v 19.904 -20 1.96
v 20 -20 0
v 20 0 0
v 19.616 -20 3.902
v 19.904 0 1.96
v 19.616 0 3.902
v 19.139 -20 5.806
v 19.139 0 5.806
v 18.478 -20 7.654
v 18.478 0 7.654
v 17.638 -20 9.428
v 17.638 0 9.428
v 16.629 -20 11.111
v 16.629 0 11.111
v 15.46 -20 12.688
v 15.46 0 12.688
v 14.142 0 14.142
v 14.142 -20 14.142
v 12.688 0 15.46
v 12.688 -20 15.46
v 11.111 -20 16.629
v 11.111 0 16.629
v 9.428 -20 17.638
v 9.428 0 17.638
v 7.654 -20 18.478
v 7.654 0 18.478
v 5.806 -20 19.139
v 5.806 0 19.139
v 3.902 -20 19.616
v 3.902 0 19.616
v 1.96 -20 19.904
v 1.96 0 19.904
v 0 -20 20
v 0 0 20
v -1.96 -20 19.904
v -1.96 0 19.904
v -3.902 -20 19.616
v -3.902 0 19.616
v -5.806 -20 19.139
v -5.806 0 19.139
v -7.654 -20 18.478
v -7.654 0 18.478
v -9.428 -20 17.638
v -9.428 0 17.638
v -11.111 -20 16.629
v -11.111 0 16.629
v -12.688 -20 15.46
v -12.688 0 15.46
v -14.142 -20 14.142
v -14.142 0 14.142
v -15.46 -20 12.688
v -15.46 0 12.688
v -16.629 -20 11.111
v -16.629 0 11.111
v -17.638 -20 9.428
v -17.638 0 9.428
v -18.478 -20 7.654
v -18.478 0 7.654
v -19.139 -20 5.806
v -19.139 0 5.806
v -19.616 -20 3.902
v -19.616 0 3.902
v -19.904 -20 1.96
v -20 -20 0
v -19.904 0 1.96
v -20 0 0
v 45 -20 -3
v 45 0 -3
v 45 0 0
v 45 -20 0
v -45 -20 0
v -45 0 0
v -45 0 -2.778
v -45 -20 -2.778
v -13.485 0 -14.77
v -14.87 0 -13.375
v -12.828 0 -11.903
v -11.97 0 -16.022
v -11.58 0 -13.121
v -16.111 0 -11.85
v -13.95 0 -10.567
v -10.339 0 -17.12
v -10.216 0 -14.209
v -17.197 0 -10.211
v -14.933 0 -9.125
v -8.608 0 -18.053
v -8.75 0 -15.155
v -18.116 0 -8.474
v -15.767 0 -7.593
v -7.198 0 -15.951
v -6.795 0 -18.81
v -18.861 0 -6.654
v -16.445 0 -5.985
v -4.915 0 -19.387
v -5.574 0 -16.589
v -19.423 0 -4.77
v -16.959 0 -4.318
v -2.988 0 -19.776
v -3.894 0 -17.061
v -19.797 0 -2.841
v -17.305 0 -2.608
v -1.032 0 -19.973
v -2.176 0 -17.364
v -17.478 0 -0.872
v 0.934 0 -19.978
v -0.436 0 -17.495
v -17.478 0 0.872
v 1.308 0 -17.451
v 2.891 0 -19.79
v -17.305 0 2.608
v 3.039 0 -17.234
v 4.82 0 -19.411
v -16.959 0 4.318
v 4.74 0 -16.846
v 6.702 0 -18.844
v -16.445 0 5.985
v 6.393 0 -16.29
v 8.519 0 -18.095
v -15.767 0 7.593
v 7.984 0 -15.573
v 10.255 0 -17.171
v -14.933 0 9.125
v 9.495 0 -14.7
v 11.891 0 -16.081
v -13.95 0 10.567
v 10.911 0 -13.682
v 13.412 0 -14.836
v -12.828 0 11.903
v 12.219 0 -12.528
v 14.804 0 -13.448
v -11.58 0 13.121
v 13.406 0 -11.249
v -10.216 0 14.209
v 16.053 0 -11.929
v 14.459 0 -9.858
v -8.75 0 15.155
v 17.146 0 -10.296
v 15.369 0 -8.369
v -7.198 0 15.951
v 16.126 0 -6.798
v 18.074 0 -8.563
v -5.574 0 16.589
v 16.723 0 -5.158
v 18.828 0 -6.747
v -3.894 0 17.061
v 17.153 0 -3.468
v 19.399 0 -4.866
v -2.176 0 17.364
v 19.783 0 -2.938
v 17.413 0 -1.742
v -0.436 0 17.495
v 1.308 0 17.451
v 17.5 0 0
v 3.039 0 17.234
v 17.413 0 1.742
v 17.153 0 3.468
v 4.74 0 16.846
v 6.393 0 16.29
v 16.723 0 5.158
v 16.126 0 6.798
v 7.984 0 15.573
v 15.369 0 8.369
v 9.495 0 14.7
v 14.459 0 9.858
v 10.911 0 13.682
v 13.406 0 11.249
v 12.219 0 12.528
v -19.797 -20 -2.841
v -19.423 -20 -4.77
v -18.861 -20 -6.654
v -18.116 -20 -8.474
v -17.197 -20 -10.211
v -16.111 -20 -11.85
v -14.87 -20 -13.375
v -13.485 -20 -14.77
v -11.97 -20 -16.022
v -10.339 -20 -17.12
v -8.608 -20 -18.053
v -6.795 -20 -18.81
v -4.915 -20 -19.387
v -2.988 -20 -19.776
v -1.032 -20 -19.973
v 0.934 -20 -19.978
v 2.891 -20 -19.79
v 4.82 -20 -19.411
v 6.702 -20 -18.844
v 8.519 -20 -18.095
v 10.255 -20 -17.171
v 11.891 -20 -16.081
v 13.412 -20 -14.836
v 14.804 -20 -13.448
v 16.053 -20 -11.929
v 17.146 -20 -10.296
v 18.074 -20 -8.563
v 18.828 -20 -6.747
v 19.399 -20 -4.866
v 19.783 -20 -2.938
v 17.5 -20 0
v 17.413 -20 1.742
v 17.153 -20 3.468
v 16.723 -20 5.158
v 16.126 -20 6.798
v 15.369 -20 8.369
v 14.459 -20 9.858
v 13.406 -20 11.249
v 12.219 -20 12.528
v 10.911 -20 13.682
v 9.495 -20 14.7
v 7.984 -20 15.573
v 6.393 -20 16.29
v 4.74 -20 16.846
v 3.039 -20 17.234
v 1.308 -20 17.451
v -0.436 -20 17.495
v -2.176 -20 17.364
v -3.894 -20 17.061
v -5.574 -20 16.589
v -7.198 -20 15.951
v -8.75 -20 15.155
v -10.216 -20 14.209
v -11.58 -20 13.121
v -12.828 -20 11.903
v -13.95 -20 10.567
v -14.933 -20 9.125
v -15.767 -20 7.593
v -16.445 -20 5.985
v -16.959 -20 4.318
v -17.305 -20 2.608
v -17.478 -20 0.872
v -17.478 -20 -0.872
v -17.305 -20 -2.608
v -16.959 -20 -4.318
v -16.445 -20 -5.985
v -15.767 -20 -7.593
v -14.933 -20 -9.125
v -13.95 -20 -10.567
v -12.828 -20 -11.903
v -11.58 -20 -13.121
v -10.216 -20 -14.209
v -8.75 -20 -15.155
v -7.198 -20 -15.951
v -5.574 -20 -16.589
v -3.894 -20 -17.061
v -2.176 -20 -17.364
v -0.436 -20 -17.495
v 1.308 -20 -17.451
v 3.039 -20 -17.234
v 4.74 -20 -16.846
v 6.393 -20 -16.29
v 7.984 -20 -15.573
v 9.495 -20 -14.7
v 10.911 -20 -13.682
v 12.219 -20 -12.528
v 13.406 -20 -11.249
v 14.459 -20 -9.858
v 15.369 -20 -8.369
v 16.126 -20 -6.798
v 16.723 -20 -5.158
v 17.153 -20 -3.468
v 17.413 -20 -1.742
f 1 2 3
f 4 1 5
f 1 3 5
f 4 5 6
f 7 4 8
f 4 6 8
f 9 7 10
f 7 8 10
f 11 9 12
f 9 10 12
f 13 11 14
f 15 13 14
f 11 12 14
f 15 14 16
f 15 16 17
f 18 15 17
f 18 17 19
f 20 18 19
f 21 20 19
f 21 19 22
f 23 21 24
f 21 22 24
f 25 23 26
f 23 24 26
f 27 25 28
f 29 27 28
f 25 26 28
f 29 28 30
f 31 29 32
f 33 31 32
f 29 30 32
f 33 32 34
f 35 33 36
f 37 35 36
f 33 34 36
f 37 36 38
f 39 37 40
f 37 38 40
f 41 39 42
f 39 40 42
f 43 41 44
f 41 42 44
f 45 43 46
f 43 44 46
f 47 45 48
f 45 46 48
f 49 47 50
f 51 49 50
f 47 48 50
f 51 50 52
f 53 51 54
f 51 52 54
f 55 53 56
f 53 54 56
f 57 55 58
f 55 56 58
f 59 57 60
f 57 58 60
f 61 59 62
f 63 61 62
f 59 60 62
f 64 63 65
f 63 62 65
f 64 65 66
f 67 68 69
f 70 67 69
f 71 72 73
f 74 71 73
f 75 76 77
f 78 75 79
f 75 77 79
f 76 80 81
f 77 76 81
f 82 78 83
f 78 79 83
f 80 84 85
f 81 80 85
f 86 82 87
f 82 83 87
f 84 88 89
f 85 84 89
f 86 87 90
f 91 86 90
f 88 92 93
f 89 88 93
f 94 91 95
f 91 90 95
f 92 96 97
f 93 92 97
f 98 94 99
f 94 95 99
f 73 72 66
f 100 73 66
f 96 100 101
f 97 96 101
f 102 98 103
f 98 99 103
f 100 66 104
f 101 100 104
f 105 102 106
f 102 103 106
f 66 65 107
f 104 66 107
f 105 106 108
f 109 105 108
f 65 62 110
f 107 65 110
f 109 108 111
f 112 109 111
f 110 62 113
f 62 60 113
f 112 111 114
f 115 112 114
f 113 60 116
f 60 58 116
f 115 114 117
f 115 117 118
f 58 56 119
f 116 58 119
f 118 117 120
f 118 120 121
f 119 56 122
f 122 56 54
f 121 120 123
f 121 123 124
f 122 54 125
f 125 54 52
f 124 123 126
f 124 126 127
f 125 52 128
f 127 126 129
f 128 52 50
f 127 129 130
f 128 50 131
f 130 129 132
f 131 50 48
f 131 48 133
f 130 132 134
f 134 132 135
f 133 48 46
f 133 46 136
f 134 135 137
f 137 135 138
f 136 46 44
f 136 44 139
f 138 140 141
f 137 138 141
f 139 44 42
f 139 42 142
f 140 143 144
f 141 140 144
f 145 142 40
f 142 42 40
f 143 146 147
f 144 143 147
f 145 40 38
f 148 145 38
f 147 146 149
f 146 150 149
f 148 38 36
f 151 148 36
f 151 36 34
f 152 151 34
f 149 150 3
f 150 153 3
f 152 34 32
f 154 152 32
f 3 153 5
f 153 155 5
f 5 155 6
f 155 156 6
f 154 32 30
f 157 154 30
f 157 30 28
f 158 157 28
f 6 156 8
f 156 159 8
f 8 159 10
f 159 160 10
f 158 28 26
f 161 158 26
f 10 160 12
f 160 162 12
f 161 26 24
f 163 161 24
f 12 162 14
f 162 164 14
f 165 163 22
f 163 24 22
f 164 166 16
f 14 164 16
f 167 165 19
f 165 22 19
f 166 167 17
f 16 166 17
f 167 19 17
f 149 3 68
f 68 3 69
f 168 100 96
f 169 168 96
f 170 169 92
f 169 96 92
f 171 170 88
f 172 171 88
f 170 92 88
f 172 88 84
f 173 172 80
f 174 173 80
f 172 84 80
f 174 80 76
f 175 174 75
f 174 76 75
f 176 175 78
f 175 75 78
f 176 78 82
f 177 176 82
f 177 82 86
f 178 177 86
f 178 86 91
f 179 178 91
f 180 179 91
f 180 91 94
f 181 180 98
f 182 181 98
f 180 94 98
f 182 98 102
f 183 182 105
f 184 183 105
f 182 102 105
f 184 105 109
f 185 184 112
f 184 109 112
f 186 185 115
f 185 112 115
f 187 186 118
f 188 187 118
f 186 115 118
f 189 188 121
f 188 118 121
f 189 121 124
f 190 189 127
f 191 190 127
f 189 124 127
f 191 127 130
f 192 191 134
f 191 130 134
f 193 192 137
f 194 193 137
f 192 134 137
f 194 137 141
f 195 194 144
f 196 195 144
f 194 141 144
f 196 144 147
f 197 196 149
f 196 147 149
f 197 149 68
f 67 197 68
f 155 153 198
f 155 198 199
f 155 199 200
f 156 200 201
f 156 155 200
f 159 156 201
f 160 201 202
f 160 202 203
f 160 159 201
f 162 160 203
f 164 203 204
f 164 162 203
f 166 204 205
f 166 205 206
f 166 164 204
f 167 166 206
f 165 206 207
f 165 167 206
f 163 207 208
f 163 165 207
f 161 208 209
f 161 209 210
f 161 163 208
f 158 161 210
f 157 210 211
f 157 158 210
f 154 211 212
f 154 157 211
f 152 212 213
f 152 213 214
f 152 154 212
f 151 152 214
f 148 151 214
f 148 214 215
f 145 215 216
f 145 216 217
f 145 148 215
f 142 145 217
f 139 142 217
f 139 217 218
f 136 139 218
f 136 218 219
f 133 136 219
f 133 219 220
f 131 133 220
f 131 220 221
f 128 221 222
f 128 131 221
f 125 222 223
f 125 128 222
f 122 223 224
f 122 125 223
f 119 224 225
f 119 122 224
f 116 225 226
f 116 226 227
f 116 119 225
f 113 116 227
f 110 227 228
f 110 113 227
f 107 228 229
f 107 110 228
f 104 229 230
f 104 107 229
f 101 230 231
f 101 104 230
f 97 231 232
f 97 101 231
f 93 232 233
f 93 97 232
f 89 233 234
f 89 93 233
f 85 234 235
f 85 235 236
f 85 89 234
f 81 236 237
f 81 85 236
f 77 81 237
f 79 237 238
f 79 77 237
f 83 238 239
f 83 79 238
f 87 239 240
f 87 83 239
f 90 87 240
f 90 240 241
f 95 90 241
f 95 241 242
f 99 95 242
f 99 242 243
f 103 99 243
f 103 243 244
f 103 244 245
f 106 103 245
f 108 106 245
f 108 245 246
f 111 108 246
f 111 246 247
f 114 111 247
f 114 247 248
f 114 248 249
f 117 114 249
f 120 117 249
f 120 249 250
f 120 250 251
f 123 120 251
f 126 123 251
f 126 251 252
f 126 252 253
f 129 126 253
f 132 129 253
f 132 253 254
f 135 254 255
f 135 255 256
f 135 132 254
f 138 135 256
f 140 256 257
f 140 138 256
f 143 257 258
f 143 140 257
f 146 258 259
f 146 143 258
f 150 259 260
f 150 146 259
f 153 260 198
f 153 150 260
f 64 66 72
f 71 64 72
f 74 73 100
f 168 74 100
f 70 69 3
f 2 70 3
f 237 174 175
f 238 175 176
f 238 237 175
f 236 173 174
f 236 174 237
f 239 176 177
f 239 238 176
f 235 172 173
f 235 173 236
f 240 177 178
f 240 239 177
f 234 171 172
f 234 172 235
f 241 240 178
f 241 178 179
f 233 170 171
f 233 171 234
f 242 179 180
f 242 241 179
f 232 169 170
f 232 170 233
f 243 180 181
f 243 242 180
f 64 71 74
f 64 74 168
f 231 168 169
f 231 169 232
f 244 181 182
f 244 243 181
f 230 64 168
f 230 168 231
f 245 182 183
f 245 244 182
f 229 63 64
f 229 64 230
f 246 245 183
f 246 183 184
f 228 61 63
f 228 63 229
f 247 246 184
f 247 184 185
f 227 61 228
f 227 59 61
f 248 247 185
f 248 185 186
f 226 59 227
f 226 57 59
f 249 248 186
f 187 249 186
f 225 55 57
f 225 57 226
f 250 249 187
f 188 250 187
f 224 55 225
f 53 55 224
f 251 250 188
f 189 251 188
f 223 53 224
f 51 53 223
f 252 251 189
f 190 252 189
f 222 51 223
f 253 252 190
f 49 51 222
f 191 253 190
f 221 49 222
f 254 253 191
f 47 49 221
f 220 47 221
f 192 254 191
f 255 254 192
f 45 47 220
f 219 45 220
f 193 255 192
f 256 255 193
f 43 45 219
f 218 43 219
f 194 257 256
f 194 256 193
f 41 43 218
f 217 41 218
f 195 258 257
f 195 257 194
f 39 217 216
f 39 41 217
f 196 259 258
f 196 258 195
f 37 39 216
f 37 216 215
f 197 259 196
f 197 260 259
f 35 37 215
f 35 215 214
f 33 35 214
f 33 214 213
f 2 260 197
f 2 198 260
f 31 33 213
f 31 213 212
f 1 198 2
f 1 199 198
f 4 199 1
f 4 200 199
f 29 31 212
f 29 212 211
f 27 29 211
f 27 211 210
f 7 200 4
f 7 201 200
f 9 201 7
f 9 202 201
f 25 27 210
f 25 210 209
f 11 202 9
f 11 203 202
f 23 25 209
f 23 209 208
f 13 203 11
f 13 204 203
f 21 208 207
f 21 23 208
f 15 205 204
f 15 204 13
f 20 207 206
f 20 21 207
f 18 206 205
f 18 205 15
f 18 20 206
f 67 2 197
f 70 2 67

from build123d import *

# Parameters (mm, degrees)
F0_R     = 17.5
F1_DEPTH = 20


with BuildPart() as f1:
    # F0 (on Front) → F1 (new body)
    with BuildSketch(Plane.XZ):
        with BuildLine():
            Line((45, 0), (20, 0))
            ThreePointArc((20, 0), (0, 20), (-20, 0))
            Line((-20, 0), (-45, 0))
            Line((-45, 0), (-45, -2.778499))
            Line((-45, -2.778499), (-19.797258, -2.840526))
            ThreePointArc((-19.797258, -2.840526), (-0.049222, -19.999939), (19.783036, -2.937938))
            Line((19.783036, -2.937938), (45, -3))
            Line((45, -3), (45, 0))
        make_face()
        Circle(F0_R, mode=Mode.SUBTRACT)
    extrude(amount=F1_DEPTH)


solid = f1.part
